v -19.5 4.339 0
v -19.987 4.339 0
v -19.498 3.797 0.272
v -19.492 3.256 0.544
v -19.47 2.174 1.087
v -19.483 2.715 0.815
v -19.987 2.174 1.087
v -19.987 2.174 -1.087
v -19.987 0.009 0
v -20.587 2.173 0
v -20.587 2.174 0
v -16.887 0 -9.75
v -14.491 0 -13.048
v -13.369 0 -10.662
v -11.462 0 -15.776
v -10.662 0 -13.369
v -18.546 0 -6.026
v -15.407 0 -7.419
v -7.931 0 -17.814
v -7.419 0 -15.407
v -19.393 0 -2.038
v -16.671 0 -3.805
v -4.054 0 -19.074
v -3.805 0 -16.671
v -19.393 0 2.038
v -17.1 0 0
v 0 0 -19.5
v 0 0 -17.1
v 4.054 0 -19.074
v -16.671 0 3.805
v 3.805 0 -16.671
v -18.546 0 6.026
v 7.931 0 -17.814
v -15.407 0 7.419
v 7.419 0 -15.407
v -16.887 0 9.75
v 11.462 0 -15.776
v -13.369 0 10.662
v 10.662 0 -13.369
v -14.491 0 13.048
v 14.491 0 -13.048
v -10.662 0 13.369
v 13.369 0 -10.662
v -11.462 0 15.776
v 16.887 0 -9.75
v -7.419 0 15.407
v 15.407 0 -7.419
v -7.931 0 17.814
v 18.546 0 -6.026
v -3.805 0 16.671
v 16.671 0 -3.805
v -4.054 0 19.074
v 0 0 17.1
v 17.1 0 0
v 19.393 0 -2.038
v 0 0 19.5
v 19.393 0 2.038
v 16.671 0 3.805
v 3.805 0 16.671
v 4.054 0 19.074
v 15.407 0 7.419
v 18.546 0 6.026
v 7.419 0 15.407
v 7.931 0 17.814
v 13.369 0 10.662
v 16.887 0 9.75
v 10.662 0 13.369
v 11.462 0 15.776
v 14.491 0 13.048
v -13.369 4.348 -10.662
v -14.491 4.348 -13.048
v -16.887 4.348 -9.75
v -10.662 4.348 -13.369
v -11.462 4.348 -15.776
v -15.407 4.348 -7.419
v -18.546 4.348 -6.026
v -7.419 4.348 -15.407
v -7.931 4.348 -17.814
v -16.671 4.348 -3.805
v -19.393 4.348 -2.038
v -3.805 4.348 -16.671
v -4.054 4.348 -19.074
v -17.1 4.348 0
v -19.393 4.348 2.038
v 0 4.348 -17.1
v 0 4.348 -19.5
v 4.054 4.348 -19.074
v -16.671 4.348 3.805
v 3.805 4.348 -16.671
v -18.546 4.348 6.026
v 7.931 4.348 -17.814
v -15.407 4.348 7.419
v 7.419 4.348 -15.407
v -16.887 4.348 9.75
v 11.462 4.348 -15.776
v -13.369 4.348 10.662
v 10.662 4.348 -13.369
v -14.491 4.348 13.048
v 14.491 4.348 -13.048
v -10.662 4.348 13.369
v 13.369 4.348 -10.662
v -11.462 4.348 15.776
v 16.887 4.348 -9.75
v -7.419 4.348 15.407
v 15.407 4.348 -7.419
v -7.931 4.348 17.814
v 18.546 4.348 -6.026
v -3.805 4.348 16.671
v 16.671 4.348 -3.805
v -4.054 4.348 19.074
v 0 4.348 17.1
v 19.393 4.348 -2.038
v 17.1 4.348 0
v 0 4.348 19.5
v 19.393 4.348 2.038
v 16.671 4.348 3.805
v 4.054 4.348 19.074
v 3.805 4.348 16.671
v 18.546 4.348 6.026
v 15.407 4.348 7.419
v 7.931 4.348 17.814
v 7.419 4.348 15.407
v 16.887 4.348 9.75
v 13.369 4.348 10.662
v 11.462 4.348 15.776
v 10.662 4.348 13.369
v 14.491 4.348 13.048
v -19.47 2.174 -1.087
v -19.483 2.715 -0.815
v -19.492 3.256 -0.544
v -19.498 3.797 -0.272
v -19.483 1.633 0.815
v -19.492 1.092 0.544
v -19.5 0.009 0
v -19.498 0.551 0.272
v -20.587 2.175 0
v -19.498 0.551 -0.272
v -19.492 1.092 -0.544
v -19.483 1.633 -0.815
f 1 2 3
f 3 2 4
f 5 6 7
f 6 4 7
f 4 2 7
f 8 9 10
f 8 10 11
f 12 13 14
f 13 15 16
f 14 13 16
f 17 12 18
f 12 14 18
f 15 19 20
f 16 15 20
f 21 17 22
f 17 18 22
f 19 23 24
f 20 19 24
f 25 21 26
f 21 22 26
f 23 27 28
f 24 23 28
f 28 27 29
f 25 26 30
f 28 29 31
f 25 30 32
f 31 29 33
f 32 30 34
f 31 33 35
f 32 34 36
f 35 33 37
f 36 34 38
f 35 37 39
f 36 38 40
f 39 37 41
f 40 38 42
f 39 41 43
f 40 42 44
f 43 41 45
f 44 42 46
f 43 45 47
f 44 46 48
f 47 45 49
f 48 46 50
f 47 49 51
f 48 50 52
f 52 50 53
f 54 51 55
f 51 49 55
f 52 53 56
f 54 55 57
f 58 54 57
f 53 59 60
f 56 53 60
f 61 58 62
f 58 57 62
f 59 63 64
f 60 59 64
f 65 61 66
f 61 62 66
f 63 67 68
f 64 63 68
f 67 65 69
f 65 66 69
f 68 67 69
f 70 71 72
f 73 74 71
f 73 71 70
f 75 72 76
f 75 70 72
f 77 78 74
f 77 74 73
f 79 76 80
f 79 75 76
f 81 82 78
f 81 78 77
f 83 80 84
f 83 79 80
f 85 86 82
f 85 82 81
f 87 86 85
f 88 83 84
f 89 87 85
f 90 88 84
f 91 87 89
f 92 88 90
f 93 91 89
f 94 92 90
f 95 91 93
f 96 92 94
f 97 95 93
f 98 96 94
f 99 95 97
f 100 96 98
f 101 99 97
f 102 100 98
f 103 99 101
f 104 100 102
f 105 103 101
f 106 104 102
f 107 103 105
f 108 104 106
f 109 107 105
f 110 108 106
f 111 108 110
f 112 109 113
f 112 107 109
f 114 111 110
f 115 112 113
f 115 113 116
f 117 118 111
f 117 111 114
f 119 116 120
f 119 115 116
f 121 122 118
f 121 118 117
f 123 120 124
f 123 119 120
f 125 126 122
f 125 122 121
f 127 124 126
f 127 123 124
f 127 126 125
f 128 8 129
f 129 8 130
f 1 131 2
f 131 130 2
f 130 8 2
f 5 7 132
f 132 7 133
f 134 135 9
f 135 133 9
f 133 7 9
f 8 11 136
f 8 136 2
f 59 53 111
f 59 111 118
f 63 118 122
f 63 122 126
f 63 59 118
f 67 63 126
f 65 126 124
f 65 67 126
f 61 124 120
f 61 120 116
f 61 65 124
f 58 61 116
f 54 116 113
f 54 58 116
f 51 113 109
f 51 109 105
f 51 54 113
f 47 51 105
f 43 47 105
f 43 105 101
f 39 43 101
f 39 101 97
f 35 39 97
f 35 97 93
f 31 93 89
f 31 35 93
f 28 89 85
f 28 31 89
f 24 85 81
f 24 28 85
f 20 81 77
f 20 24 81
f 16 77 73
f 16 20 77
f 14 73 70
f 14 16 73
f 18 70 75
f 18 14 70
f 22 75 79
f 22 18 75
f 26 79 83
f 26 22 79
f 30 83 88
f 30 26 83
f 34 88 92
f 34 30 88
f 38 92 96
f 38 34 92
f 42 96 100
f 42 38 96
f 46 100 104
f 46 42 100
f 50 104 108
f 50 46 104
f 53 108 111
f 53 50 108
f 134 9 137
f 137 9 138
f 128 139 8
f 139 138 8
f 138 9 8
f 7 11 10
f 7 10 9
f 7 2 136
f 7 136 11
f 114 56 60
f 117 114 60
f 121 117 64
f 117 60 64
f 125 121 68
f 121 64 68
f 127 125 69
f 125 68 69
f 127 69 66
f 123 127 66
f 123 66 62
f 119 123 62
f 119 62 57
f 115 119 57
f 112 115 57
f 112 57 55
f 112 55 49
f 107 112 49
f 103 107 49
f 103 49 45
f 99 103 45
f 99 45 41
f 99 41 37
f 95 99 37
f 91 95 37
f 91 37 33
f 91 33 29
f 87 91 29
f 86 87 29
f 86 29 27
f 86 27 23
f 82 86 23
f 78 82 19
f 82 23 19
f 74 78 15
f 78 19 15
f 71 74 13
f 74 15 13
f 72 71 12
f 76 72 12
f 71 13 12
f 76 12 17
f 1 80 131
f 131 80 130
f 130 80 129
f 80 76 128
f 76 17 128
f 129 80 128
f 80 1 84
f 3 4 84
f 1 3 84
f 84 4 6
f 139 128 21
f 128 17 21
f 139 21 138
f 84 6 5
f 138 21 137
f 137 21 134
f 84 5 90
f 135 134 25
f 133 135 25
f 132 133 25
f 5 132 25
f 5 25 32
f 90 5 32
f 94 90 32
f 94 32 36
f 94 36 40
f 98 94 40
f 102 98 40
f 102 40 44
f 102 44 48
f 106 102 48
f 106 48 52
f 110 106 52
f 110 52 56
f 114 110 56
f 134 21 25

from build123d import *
from OCP.BRepFilletAPI import BRepFilletAPI_MakeChamfer

# Parameters (mm, degrees)
SKETCH1_R           = 19.5
SKETCH1_R_2         = 17.1
BOSS_EXTRUDE1_DEPTH = 4.347826087
BOSS_EXTRUDE2_DEPTH = 1.08695652
CHAMFER1_SIZE       = 0.6
CHAMFER1_SIZE2      = 0.971


with BuildPart() as part:
    # Sketch1 → Boss-Extrude1 (new body)
    with BuildSketch(Plane(origin=(0, 0, 0), x_dir=(1, 0, 0), z_dir=(0, 1, 0))):
        with Locations(Location((0, 0, 0), (0, 0, 270))):
            Circle(SKETCH1_R)
        with Locations(Location((0, 0, 0), (0, 0, 270))):
            Circle(SKETCH1_R_2, mode=Mode.SUBTRACT)
    extrude(amount=BOSS_EXTRUDE1_DEPTH)

    # Sketch2 → Boss-Extrude2 (add, symmetric)
    with BuildSketch(Plane.ZY.offset(19.5)):
        Polygon((0, 0.00928426), (-1.086956522, 2.173913043), (0, 4.338541827), (1.086956522, 2.173913043), align=None)
    extrude(amount=BOSS_EXTRUDE2_DEPTH, both=True)

    # Chamfer1: one chamfer whose edges measure the first distance from different faces: ONE call of the kernel's chamfer builder (chamfer() names one face for all edges)
    chamfer1_edges_1 = [part.edges().sort_by_distance(p)[0] for p in [
        (-20.58695652, 3.256227435, -0.543478261),
    ]]
    chamfer1_side_1 = [part.faces().sort_by_distance(p)[0] for p in [
        (-20.038389639, 3.251243161, -0.545981087),
    ]]
    chamfer1_edges_2 = [part.edges().sort_by_distance(p)[0] for p in [
        (-20.58695652, 1.091598652, -0.543478261),
    ]]
    chamfer1_side_2 = [part.faces().sort_by_distance(p)[0] for p in [
        (-20.038389639, 1.096582926, -0.545981087),
    ]]
    chamfer1_edges_3 = [part.edges().sort_by_distance(p)[0] for p in [
        (-20.58695652, 1.091598652, 0.543478261),
    ]]
    chamfer1_side_3 = [part.faces().sort_by_distance(p)[0] for p in [
        (-20.038389639, 1.096582926, 0.545981087),
    ]]
    chamfer1_edges_4 = [part.edges().sort_by_distance(p)[0] for p in [
        (-20.58695652, 3.256227435, 0.543478261),
    ]]
    chamfer1_side_4 = [part.faces().sort_by_distance(p)[0] for p in [
        (-20.038389639, 3.251243161, 0.545981087),
    ]]
    chamfer1 = BRepFilletAPI_MakeChamfer(part.part.solid().wrapped)
    for e in chamfer1_edges_1:
        chamfer1.Add(CHAMFER1_SIZE, CHAMFER1_SIZE2, e.wrapped, chamfer1_side_1[0].wrapped)  # the first distance lies on this face
    for e in chamfer1_edges_2:
        chamfer1.Add(CHAMFER1_SIZE, CHAMFER1_SIZE2, e.wrapped, chamfer1_side_2[0].wrapped)  # the first distance lies on this face
    for e in chamfer1_edges_3:
        chamfer1.Add(CHAMFER1_SIZE, CHAMFER1_SIZE2, e.wrapped, chamfer1_side_3[0].wrapped)  # the first distance lies on this face
    for e in chamfer1_edges_4:
        chamfer1.Add(CHAMFER1_SIZE, CHAMFER1_SIZE2, e.wrapped, chamfer1_side_4[0].wrapped)  # the first distance lies on this face
    add(Compound.cast(chamfer1.Shape()), mode=Mode.REPLACE)


solid = part.part
